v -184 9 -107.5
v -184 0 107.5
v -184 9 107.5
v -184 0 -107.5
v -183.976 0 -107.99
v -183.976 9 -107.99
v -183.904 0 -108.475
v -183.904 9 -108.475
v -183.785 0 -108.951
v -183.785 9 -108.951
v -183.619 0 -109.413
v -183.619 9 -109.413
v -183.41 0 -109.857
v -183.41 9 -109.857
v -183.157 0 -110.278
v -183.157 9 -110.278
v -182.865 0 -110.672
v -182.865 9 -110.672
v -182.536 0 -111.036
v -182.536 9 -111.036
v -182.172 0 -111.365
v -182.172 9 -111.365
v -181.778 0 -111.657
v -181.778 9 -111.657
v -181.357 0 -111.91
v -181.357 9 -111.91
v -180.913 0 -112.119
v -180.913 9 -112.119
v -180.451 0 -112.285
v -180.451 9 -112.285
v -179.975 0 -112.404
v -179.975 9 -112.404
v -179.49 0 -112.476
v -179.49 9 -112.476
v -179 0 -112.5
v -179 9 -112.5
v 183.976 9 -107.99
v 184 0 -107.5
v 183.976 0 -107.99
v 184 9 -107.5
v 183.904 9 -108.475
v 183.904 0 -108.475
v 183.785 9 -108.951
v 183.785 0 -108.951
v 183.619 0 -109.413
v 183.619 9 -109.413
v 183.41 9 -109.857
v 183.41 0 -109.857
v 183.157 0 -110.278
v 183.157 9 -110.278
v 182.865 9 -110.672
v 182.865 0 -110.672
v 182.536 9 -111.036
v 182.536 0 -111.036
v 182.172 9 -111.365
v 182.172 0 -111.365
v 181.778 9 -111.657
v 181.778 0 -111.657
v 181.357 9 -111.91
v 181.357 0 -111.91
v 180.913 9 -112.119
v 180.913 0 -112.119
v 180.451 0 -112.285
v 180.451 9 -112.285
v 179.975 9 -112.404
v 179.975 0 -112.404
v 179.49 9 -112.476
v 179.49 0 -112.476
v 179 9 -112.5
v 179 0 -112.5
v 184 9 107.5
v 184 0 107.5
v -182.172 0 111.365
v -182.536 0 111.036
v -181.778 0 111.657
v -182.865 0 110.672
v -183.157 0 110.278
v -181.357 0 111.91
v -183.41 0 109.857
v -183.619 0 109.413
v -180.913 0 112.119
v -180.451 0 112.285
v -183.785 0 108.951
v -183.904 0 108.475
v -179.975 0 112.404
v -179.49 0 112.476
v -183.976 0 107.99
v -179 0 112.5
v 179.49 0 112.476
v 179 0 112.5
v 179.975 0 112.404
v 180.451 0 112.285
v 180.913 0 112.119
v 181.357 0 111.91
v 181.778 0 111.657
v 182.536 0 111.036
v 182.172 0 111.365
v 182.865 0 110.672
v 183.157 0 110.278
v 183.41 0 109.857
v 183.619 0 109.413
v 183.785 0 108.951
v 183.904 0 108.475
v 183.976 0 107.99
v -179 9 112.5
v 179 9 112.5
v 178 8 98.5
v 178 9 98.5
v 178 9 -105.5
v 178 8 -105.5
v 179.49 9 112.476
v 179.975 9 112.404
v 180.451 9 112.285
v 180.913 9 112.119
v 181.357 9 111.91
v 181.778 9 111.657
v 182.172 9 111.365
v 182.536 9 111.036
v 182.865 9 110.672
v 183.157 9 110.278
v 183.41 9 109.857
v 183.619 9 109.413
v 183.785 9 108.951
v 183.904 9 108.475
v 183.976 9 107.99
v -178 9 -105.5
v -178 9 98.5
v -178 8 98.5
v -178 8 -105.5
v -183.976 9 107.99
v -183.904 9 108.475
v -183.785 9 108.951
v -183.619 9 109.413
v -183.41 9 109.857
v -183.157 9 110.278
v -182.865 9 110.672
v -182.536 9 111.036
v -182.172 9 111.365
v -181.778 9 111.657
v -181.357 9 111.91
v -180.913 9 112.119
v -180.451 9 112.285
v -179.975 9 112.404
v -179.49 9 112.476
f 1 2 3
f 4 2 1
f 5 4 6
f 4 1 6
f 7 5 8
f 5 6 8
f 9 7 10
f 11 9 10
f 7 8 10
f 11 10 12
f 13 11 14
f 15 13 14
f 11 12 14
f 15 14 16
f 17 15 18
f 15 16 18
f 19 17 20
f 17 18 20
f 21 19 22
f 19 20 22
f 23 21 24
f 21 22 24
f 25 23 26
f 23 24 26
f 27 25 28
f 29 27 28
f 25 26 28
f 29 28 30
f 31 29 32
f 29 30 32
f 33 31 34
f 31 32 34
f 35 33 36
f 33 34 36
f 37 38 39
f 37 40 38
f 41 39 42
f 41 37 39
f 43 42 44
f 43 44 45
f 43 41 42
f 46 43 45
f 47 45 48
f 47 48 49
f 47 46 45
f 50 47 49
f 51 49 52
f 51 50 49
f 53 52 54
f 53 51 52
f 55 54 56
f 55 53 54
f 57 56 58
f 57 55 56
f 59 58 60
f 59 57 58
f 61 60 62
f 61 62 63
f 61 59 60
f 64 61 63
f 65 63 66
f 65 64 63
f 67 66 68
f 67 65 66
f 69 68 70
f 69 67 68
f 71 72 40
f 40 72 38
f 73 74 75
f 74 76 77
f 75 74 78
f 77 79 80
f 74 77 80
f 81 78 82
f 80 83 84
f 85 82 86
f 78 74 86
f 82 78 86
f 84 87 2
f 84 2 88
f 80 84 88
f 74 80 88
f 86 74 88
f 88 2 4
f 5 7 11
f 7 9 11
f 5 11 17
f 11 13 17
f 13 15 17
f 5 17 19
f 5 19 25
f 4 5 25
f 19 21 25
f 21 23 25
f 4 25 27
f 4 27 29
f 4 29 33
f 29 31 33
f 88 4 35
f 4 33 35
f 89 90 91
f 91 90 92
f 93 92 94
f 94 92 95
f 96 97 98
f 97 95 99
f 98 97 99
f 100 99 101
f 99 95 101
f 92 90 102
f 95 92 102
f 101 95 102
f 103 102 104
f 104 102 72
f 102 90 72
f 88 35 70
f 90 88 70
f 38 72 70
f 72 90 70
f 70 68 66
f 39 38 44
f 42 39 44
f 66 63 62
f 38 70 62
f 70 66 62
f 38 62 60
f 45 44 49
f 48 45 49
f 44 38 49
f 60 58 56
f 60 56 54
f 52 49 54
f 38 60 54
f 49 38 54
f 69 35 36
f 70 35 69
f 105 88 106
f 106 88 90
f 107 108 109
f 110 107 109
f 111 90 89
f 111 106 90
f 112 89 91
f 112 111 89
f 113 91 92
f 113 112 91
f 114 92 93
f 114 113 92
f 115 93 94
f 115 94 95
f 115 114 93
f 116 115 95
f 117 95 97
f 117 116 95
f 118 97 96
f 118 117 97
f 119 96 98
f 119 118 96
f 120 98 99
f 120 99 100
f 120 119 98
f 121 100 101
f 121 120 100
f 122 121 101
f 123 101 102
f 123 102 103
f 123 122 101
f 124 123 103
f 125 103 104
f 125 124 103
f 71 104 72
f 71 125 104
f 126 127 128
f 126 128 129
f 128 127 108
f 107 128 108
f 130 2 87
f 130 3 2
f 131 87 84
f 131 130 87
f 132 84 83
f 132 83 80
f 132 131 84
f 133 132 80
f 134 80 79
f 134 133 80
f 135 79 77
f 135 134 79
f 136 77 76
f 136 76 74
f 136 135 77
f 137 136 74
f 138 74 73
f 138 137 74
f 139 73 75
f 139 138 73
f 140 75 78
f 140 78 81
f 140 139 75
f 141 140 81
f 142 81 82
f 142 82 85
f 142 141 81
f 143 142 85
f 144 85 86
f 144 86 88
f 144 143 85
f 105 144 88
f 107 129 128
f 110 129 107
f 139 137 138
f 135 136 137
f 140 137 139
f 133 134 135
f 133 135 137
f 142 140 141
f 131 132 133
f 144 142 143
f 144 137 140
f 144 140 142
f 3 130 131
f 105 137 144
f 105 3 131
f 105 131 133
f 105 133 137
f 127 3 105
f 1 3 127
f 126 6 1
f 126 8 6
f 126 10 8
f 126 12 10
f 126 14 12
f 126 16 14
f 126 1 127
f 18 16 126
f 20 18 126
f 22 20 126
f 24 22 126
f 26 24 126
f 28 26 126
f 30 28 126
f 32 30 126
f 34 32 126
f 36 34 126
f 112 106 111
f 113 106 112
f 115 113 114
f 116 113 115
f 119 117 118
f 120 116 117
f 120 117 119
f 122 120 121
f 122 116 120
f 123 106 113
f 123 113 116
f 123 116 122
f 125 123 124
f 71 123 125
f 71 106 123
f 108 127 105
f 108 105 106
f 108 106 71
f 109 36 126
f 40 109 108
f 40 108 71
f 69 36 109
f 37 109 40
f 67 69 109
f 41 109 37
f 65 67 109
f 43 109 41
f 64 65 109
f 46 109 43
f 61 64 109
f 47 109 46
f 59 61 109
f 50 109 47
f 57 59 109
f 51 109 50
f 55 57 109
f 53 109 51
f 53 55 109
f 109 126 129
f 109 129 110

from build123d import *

# Parameters (mm, degrees)
SKETCH_1_W          = 368
SKETCH_1_H          = 225
EXTRUDE_1_DEPTH     = 9
FILLET_1_R          = 5
SKETCH_2_W          = 356
SKETCH_2_H          = 204
CUT_EXTRUDE_1_DEPTH = 1


with BuildPart() as part:
    # 草图1 → 凸台-拉伸1 (new body)
    with BuildSketch(Plane(origin=(0, 0, 0), x_dir=(1, 0, 0), z_dir=(0, 1, 0))):
        Rectangle(SKETCH_1_W, SKETCH_1_H)
    extrude(amount=EXTRUDE_1_DEPTH)

    # 圆角1
    fillet_1_edges = [part.edges().sort_by_distance(p)[0] for p in [
        (-184, 4.5, -112.5),
        (184, 4.5, -112.5),
        (184, 4.5, 112.5),
        (-184, 4.5, 112.5),
    ]]
    fillet(fillet_1_edges, radius=FILLET_1_R)

    # 草图2 → 切除-拉伸1 (cut)
    with BuildSketch(Plane(origin=(0, 9, 0), x_dir=(1, 0, 0), z_dir=(0, 1, 0))):
        with Locations((0, 3.5)):
            Rectangle(SKETCH_2_W, SKETCH_2_H)
    extrude(amount=-CUT_EXTRUDE_1_DEPTH, mode=Mode.SUBTRACT)


solid = part.part
